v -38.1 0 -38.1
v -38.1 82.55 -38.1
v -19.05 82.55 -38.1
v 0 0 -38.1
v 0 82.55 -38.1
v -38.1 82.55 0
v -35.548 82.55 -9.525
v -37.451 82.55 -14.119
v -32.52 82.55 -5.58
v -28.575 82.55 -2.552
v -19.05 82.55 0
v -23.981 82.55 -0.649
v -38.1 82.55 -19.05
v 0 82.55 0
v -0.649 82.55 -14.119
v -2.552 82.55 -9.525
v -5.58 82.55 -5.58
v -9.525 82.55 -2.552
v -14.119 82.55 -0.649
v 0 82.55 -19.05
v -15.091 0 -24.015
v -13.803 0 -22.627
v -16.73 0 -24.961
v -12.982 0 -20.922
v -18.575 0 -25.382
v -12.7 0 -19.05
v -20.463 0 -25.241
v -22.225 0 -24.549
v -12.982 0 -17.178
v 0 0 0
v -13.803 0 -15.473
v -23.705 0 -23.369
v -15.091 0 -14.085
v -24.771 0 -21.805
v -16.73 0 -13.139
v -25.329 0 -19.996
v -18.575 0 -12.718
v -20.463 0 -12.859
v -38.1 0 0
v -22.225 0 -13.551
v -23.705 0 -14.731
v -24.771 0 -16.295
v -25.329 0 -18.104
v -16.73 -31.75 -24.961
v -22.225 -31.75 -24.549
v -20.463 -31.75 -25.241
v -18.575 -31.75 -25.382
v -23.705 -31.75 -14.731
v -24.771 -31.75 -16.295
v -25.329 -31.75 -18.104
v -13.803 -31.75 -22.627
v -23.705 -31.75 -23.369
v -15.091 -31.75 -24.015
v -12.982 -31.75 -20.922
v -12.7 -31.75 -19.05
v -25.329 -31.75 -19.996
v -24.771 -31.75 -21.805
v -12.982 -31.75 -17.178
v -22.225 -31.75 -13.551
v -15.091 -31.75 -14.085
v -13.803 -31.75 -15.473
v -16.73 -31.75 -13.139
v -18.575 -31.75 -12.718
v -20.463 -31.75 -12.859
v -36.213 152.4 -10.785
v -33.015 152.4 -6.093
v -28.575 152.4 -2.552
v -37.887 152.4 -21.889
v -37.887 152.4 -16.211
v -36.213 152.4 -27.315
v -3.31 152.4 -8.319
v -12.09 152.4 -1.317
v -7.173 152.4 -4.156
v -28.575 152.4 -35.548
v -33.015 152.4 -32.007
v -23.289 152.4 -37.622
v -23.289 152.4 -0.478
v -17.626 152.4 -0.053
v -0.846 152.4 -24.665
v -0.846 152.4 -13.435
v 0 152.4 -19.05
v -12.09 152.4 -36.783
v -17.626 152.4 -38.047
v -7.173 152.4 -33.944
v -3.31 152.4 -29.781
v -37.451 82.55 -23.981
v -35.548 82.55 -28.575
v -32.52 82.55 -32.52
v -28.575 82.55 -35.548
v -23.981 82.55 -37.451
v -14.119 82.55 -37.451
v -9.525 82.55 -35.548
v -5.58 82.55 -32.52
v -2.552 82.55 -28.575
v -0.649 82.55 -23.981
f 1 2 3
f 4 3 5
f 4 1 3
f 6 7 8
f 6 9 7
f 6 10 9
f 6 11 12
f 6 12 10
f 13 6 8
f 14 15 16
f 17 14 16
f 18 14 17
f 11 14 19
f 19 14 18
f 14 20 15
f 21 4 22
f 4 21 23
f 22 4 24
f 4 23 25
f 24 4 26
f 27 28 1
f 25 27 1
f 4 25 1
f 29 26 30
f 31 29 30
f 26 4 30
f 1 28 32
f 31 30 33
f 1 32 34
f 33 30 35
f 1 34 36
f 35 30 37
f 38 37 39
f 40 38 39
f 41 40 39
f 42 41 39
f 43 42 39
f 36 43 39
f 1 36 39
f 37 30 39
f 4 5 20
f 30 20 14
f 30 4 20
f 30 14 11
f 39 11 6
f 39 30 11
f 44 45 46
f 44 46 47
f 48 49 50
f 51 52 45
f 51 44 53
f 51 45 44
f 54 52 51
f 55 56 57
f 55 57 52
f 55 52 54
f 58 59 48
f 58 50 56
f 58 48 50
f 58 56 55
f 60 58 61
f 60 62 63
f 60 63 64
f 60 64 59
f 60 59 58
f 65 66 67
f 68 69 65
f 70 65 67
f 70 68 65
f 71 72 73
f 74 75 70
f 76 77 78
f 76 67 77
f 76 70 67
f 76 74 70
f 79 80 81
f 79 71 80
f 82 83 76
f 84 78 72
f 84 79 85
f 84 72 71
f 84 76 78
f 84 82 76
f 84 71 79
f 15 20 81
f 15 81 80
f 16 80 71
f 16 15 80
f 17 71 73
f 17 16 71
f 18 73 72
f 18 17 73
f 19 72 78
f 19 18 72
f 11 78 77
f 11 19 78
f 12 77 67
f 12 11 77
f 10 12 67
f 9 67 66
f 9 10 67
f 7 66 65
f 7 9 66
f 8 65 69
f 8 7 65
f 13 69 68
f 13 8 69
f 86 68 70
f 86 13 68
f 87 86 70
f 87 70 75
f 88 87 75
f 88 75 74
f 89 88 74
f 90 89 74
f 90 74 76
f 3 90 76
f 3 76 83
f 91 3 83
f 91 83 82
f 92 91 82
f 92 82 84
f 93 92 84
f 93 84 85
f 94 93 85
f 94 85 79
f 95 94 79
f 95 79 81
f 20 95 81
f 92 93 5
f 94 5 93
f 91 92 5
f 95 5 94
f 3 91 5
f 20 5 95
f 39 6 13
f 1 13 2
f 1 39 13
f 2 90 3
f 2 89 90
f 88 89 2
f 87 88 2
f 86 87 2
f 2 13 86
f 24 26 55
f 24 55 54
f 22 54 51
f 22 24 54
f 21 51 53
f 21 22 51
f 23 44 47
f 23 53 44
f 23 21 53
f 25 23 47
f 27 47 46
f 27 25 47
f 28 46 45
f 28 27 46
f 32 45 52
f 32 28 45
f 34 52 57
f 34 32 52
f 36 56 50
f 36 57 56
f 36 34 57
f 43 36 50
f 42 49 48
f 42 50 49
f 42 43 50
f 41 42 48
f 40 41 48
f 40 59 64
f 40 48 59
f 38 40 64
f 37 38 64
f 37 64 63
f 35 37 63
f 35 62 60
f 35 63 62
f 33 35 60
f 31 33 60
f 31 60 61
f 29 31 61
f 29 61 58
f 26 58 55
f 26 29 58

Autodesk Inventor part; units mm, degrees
ref_plane "YZ Plane" through (0, 0, 0) normal (1, 0, 0) x (0, 1, 0)
ref_plane "XZ Plane" through (0, 0, 0) normal (0, 1, 0) x (-1, 0, 0)
ref_plane "XY Plane" through (0, 0, 0) normal (0, 0, 1) x (1, 0, 0)
sketch "Sketch1" plane through (0, 0, 0) normal (0, 1, 0) x (-1, 0, 0)
  line L0 (0, 0) -> (38.1, 0)
  line L1 (38.1, 0) -> (38.1, -38.1)
  line L2 (38.1, -38.1) -> (0, -38.1)
  line L3 (0, -38.1) -> (0, 0)
  dimension "d0" = 38.1
  dimension "d1" = 38.1
extrude "Extrusion1" add sketch "Sketch1" along normal blind 82.55
sketch "Sketch2" plane through (0, 82.55, 0) normal (0, 1, 0) x (1, 0, 0)
  circle A0 centre (-19.05, 19.05) radius 19.05
  line L0 (-38.1, 0) -> (-38.1, 38.1) projected
  line L1 (-38.1, 38.1) -> (0, 38.1) projected
  point P0 (0, 0)
  dimension "d4" = 38.1
  dimension "d5" = 19.05
  dimension "d6" = 19.05
extrude "Extrusion2" add sketch "Sketch2" along normal blind 69.85 contours A0
sketch "Sketch3" plane through (0, 0, 0) normal (0, -1, 0) x (1, 0, 0)
  circle A0 centre (-19.05, -19.05) radius 6.35
  line L0 (0, 0) -> (-38.1, 0) projected
  line L1 (-38.1, 0) -> (-38.1, -38.1) projected
  dimension "d9" = 12.7
  dimension "d10" = 19.05
  dimension "d11" = 19.05
extrude "Extrusion3" add sketch "Sketch3" along normal blind 31.75
properties part number "articulation motor 300 to 1"
